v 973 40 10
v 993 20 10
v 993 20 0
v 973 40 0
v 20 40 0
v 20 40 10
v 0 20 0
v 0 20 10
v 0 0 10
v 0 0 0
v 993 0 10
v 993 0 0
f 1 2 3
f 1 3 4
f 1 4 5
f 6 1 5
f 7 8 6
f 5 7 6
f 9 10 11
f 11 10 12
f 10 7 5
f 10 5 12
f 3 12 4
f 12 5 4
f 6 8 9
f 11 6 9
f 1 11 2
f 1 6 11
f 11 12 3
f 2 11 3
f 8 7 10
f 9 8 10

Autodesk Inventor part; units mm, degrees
ref_plane "YZ Plane" through (0, 0, 0) normal (1, 0, 0) x (0, 1, 0)
ref_plane "XZ Plane" through (0, 0, 0) normal (0, 1, 0) x (-1, 0, 0)
ref_plane "XY Plane" through (0, 0, 0) normal (0, 0, 1) x (1, 0, 0)
sketch "Sketch1" plane through (0, 0, 0) normal (0, 0, 1) x (1, 0, 0)
  line L0 (0, 0) -> (993, 0)
  line L1 (993, 0) -> (993, 40)
  line L2 (993, 40) -> (0, 40)
  line L3 (0, 40) -> (0, 0)
  dimension "d0" = 993
  dimension "d1" = 40
extrude "Extrusion1" add sketch "Sketch1" along normal blind 10
sketch "Sketch5" plane through (0, 0, 10) normal (0, 0, 1) x (1, 0, 0)
  line L0 (0, 40) -> (0, 0) projected
  line L1 (0, 20) -> (20.0002, 40)
  line L2 (993, 40) -> (0, 40) projected
  line L3 (993, 0) -> (993, 40) projected
  line L4 (993, 20) -> (973.0002, 40)
extrude "Extrusion5" cut sketch "Sketch5" against normal blind 10
properties part number "vslot hinge brace top"
